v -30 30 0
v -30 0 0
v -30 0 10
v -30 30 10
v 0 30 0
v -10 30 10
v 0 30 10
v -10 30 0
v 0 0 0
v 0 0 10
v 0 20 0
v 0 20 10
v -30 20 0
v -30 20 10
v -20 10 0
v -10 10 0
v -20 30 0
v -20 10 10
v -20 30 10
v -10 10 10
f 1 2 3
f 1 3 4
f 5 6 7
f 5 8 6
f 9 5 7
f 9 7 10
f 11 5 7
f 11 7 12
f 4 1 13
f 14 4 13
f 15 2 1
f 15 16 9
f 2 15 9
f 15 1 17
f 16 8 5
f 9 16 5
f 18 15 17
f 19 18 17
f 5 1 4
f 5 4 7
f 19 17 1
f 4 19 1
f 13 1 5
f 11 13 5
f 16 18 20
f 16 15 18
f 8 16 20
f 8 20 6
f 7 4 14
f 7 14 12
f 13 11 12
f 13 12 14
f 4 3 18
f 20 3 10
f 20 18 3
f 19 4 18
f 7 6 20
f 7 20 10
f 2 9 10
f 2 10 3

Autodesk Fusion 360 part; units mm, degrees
sketch "Sketch1" plane through (0, 0, 0) normal (0, 0, 1) x (1, 0, 0)
  line L0 (0, 0) -> (-30, 0)
  line L1 (-30, 0) -> (-30, 10)
  line L2 (-30, 10) -> (0, 10)
  line L3 (0, 10) -> (0, 0)
  line L4 (-30, 10) -> (-20, 10)
  line L5 (-20, 10) -> (-20, 30)
  line L6 (-20, 30) -> (-30, 30)
  line L7 (-30, 30) -> (-30, 10)
  line L8 (0, 10) -> (-10, 10)
  line L9 (-10, 10) -> (-10, 30)
  line L10 (-10, 30) -> (0, 30)
  line L11 (0, 30) -> (0, 10)
  line L12 (-30, 30) -> (0, 30)
  line L13 (0, 30) -> (0, 20)
  line L14 (0, 20) -> (-30, 20)
  line L15 (-30, 20) -> (-30, 30)
extrude "Extrude1" add sketch "Sketch1" along normal blind 10 contours L0 L1 L2 L3 L4 L8 | L2 L8 L9 L11 L14 | L2 L4 L5 L7 L14 | L9 L10 L11 L12 L13 L14 | L5 L6 L7 L12 L14 L15 makes body 1
extrude "Extrude1'" add sketch "Sketch1" along normal blind 10 separate body contours L9 L10 L11 L12 L13 L14 | L5 L6 L7 L12 L14 L15 | L5 L9 L12 L14 makes body 2 in component "Tool"
component "Tool" placed x (1, 0, 0) y (0, 1, 0) z (0, 0, 1) at (0, 0, 0)
